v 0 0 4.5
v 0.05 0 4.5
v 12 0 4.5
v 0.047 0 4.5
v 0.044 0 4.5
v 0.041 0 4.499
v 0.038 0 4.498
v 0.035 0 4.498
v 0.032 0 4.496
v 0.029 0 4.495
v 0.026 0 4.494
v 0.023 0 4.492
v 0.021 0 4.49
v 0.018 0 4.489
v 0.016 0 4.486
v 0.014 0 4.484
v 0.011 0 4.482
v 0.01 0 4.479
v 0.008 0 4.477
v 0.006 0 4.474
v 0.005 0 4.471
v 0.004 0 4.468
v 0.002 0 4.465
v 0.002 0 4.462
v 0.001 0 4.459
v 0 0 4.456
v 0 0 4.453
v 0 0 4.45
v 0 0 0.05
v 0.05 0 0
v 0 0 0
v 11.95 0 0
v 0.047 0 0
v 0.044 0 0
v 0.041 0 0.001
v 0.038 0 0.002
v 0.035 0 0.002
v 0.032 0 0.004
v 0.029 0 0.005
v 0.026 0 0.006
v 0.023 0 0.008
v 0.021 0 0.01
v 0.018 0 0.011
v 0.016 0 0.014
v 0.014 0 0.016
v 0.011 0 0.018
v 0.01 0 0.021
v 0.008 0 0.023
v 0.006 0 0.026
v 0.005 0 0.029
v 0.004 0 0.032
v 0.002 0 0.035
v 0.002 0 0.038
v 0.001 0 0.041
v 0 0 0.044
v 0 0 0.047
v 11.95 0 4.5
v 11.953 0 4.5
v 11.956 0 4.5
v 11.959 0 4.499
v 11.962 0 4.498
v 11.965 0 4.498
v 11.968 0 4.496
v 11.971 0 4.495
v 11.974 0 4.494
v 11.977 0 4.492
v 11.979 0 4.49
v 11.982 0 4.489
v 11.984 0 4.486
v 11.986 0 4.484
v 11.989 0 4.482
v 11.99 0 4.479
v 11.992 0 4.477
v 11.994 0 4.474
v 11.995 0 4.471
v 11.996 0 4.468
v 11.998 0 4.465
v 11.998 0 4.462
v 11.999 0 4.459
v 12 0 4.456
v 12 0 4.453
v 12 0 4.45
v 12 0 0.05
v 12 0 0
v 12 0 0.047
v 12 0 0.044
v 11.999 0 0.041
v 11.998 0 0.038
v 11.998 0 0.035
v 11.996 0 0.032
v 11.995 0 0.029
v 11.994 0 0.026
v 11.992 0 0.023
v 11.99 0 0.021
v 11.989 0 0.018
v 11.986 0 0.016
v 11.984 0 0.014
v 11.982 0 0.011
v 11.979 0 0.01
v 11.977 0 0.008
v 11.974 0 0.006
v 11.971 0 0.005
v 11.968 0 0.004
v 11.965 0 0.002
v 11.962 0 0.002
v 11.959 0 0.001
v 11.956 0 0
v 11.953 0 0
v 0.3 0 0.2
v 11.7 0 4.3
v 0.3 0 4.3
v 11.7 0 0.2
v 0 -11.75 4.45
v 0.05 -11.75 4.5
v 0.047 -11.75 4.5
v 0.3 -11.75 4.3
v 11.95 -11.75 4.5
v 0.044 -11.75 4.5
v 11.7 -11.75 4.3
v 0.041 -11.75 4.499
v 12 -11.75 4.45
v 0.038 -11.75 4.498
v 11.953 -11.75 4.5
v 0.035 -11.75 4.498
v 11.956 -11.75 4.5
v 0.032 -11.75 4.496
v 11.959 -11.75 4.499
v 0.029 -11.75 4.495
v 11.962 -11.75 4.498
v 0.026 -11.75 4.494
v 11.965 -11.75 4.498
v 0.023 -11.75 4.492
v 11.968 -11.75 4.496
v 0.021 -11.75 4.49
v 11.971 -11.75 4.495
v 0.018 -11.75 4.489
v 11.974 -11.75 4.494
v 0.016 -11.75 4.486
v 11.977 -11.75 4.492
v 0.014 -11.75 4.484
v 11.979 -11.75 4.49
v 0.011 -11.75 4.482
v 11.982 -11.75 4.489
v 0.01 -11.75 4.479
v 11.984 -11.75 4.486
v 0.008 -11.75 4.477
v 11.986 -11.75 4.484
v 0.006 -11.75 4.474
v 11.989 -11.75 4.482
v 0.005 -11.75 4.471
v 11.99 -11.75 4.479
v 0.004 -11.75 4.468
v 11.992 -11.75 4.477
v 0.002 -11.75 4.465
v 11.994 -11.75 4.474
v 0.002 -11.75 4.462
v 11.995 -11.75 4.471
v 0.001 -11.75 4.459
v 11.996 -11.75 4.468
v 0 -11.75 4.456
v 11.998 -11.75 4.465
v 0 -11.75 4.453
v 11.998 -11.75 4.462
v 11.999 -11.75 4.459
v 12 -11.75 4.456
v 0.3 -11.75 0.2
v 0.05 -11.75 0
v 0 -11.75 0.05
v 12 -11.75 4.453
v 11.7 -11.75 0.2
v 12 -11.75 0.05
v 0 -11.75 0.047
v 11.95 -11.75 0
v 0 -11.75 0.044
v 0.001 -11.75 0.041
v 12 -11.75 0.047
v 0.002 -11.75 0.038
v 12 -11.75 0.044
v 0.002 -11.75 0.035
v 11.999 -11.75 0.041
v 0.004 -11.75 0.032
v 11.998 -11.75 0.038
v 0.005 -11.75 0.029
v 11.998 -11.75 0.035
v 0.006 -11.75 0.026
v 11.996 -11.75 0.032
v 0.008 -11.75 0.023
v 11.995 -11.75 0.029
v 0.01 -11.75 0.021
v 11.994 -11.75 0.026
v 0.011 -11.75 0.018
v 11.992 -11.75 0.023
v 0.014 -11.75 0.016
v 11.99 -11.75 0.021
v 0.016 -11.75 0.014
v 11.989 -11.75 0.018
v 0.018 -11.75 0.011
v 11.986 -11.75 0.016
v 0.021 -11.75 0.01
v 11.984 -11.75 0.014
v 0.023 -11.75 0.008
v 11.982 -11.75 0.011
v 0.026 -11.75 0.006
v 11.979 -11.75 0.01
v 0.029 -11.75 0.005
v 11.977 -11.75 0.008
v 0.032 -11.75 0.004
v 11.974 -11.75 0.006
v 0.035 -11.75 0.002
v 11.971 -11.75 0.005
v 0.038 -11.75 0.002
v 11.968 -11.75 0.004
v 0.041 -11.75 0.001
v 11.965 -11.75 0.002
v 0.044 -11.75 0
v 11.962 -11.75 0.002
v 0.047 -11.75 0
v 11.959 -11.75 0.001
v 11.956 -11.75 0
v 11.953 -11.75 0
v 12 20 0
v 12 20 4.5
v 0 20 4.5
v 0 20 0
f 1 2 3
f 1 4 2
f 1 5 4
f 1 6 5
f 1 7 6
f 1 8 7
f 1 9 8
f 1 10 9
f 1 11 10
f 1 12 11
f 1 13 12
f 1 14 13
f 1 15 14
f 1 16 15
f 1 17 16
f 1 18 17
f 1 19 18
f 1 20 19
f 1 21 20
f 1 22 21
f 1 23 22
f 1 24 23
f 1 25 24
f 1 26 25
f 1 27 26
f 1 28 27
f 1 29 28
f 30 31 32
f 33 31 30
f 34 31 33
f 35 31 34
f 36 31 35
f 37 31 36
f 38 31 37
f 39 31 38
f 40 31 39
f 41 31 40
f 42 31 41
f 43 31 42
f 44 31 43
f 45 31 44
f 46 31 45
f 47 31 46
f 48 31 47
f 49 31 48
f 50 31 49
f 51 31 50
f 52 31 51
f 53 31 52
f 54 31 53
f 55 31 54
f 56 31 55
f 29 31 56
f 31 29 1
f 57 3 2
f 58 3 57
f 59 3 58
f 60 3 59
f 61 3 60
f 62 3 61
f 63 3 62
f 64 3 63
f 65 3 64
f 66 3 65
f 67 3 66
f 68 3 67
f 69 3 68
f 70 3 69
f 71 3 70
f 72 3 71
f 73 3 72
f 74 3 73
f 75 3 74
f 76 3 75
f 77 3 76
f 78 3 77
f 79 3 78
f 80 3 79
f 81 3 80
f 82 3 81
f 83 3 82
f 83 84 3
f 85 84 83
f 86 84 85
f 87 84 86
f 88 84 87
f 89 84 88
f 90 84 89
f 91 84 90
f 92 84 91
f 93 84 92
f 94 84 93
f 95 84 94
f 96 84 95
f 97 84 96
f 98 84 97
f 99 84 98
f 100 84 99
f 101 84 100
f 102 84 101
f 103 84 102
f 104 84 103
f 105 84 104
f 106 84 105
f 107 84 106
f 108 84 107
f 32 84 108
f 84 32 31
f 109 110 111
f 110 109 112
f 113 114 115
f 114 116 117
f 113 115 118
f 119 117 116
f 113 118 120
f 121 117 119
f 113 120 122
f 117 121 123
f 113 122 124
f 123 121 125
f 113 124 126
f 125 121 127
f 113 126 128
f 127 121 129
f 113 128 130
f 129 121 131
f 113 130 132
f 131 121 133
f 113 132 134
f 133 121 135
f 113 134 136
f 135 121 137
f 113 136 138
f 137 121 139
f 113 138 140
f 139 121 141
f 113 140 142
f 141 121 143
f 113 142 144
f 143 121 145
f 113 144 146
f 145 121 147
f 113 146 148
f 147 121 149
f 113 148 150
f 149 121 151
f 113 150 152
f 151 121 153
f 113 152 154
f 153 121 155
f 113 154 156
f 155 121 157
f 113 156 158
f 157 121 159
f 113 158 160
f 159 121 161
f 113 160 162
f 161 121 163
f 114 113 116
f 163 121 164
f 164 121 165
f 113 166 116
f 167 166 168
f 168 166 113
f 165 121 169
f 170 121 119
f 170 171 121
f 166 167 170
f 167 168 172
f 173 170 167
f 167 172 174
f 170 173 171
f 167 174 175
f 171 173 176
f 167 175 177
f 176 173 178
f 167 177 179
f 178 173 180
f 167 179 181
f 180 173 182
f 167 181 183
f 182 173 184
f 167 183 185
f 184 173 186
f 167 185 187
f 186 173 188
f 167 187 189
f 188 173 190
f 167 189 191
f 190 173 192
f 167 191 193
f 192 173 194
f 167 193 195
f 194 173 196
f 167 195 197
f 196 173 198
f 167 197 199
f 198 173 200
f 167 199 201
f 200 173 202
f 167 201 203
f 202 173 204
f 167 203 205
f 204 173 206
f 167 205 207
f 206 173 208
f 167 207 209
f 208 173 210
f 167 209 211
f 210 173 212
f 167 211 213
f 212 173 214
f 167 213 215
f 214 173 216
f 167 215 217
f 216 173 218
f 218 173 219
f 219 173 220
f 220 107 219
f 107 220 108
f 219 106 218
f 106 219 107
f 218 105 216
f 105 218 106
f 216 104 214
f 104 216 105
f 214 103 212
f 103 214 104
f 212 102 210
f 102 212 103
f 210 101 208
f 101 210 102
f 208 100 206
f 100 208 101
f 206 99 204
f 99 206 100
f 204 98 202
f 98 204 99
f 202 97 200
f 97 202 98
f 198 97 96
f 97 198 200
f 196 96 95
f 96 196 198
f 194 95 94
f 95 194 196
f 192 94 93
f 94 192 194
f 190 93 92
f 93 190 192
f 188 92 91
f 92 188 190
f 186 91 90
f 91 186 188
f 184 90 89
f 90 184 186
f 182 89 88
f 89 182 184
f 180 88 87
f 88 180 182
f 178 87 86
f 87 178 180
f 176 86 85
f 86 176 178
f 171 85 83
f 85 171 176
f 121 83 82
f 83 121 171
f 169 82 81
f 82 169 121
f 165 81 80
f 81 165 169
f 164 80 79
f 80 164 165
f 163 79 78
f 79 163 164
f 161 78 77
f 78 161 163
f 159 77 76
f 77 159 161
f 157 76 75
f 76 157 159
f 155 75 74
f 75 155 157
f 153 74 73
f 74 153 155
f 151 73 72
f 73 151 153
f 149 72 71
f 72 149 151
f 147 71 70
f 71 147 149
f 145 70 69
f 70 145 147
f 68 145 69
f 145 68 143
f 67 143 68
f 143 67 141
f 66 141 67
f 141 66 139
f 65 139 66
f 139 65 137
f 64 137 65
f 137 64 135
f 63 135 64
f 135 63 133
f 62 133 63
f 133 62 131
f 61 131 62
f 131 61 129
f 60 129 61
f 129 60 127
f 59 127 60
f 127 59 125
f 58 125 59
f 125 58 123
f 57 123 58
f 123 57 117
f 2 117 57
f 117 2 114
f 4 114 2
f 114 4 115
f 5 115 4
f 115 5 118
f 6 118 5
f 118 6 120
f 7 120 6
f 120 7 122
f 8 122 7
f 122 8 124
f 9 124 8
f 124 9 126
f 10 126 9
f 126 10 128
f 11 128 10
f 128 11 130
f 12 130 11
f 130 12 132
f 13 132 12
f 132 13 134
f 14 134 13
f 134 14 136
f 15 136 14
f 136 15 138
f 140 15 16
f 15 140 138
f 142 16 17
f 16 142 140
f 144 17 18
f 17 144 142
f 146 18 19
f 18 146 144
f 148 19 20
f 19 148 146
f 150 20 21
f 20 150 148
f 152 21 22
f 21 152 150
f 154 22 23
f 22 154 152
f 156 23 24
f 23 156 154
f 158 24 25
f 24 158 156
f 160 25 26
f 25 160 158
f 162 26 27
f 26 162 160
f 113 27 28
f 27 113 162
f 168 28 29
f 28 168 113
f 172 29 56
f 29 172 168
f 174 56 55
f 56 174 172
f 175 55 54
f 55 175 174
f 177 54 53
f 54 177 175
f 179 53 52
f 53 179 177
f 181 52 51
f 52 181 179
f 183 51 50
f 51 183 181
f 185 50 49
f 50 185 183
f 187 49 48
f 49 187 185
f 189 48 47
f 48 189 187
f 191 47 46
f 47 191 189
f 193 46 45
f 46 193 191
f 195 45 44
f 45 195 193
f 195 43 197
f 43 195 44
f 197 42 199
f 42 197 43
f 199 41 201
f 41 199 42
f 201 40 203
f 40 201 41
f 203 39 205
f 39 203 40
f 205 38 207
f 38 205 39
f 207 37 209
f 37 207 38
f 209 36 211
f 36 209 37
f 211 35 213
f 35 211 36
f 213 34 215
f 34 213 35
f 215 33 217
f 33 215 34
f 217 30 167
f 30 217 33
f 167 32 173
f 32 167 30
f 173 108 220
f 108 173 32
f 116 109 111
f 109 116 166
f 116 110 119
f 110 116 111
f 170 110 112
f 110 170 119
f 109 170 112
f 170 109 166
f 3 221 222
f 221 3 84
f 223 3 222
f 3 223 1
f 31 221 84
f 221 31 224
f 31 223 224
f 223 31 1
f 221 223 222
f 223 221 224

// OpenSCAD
$fn=100;
module usb() {
	translate([6,0,2.25]) rotate([90,0,0])
	linear_extrude(height = 11.75) {
		difference() {
			minkowski() {
				square([11.9, 4.4], center=true);
				circle(d = 0.1);
			}
			square([11.4,4.1], center=true);
		}	
	}
}
usb();
cube([12,20,4.5]);
